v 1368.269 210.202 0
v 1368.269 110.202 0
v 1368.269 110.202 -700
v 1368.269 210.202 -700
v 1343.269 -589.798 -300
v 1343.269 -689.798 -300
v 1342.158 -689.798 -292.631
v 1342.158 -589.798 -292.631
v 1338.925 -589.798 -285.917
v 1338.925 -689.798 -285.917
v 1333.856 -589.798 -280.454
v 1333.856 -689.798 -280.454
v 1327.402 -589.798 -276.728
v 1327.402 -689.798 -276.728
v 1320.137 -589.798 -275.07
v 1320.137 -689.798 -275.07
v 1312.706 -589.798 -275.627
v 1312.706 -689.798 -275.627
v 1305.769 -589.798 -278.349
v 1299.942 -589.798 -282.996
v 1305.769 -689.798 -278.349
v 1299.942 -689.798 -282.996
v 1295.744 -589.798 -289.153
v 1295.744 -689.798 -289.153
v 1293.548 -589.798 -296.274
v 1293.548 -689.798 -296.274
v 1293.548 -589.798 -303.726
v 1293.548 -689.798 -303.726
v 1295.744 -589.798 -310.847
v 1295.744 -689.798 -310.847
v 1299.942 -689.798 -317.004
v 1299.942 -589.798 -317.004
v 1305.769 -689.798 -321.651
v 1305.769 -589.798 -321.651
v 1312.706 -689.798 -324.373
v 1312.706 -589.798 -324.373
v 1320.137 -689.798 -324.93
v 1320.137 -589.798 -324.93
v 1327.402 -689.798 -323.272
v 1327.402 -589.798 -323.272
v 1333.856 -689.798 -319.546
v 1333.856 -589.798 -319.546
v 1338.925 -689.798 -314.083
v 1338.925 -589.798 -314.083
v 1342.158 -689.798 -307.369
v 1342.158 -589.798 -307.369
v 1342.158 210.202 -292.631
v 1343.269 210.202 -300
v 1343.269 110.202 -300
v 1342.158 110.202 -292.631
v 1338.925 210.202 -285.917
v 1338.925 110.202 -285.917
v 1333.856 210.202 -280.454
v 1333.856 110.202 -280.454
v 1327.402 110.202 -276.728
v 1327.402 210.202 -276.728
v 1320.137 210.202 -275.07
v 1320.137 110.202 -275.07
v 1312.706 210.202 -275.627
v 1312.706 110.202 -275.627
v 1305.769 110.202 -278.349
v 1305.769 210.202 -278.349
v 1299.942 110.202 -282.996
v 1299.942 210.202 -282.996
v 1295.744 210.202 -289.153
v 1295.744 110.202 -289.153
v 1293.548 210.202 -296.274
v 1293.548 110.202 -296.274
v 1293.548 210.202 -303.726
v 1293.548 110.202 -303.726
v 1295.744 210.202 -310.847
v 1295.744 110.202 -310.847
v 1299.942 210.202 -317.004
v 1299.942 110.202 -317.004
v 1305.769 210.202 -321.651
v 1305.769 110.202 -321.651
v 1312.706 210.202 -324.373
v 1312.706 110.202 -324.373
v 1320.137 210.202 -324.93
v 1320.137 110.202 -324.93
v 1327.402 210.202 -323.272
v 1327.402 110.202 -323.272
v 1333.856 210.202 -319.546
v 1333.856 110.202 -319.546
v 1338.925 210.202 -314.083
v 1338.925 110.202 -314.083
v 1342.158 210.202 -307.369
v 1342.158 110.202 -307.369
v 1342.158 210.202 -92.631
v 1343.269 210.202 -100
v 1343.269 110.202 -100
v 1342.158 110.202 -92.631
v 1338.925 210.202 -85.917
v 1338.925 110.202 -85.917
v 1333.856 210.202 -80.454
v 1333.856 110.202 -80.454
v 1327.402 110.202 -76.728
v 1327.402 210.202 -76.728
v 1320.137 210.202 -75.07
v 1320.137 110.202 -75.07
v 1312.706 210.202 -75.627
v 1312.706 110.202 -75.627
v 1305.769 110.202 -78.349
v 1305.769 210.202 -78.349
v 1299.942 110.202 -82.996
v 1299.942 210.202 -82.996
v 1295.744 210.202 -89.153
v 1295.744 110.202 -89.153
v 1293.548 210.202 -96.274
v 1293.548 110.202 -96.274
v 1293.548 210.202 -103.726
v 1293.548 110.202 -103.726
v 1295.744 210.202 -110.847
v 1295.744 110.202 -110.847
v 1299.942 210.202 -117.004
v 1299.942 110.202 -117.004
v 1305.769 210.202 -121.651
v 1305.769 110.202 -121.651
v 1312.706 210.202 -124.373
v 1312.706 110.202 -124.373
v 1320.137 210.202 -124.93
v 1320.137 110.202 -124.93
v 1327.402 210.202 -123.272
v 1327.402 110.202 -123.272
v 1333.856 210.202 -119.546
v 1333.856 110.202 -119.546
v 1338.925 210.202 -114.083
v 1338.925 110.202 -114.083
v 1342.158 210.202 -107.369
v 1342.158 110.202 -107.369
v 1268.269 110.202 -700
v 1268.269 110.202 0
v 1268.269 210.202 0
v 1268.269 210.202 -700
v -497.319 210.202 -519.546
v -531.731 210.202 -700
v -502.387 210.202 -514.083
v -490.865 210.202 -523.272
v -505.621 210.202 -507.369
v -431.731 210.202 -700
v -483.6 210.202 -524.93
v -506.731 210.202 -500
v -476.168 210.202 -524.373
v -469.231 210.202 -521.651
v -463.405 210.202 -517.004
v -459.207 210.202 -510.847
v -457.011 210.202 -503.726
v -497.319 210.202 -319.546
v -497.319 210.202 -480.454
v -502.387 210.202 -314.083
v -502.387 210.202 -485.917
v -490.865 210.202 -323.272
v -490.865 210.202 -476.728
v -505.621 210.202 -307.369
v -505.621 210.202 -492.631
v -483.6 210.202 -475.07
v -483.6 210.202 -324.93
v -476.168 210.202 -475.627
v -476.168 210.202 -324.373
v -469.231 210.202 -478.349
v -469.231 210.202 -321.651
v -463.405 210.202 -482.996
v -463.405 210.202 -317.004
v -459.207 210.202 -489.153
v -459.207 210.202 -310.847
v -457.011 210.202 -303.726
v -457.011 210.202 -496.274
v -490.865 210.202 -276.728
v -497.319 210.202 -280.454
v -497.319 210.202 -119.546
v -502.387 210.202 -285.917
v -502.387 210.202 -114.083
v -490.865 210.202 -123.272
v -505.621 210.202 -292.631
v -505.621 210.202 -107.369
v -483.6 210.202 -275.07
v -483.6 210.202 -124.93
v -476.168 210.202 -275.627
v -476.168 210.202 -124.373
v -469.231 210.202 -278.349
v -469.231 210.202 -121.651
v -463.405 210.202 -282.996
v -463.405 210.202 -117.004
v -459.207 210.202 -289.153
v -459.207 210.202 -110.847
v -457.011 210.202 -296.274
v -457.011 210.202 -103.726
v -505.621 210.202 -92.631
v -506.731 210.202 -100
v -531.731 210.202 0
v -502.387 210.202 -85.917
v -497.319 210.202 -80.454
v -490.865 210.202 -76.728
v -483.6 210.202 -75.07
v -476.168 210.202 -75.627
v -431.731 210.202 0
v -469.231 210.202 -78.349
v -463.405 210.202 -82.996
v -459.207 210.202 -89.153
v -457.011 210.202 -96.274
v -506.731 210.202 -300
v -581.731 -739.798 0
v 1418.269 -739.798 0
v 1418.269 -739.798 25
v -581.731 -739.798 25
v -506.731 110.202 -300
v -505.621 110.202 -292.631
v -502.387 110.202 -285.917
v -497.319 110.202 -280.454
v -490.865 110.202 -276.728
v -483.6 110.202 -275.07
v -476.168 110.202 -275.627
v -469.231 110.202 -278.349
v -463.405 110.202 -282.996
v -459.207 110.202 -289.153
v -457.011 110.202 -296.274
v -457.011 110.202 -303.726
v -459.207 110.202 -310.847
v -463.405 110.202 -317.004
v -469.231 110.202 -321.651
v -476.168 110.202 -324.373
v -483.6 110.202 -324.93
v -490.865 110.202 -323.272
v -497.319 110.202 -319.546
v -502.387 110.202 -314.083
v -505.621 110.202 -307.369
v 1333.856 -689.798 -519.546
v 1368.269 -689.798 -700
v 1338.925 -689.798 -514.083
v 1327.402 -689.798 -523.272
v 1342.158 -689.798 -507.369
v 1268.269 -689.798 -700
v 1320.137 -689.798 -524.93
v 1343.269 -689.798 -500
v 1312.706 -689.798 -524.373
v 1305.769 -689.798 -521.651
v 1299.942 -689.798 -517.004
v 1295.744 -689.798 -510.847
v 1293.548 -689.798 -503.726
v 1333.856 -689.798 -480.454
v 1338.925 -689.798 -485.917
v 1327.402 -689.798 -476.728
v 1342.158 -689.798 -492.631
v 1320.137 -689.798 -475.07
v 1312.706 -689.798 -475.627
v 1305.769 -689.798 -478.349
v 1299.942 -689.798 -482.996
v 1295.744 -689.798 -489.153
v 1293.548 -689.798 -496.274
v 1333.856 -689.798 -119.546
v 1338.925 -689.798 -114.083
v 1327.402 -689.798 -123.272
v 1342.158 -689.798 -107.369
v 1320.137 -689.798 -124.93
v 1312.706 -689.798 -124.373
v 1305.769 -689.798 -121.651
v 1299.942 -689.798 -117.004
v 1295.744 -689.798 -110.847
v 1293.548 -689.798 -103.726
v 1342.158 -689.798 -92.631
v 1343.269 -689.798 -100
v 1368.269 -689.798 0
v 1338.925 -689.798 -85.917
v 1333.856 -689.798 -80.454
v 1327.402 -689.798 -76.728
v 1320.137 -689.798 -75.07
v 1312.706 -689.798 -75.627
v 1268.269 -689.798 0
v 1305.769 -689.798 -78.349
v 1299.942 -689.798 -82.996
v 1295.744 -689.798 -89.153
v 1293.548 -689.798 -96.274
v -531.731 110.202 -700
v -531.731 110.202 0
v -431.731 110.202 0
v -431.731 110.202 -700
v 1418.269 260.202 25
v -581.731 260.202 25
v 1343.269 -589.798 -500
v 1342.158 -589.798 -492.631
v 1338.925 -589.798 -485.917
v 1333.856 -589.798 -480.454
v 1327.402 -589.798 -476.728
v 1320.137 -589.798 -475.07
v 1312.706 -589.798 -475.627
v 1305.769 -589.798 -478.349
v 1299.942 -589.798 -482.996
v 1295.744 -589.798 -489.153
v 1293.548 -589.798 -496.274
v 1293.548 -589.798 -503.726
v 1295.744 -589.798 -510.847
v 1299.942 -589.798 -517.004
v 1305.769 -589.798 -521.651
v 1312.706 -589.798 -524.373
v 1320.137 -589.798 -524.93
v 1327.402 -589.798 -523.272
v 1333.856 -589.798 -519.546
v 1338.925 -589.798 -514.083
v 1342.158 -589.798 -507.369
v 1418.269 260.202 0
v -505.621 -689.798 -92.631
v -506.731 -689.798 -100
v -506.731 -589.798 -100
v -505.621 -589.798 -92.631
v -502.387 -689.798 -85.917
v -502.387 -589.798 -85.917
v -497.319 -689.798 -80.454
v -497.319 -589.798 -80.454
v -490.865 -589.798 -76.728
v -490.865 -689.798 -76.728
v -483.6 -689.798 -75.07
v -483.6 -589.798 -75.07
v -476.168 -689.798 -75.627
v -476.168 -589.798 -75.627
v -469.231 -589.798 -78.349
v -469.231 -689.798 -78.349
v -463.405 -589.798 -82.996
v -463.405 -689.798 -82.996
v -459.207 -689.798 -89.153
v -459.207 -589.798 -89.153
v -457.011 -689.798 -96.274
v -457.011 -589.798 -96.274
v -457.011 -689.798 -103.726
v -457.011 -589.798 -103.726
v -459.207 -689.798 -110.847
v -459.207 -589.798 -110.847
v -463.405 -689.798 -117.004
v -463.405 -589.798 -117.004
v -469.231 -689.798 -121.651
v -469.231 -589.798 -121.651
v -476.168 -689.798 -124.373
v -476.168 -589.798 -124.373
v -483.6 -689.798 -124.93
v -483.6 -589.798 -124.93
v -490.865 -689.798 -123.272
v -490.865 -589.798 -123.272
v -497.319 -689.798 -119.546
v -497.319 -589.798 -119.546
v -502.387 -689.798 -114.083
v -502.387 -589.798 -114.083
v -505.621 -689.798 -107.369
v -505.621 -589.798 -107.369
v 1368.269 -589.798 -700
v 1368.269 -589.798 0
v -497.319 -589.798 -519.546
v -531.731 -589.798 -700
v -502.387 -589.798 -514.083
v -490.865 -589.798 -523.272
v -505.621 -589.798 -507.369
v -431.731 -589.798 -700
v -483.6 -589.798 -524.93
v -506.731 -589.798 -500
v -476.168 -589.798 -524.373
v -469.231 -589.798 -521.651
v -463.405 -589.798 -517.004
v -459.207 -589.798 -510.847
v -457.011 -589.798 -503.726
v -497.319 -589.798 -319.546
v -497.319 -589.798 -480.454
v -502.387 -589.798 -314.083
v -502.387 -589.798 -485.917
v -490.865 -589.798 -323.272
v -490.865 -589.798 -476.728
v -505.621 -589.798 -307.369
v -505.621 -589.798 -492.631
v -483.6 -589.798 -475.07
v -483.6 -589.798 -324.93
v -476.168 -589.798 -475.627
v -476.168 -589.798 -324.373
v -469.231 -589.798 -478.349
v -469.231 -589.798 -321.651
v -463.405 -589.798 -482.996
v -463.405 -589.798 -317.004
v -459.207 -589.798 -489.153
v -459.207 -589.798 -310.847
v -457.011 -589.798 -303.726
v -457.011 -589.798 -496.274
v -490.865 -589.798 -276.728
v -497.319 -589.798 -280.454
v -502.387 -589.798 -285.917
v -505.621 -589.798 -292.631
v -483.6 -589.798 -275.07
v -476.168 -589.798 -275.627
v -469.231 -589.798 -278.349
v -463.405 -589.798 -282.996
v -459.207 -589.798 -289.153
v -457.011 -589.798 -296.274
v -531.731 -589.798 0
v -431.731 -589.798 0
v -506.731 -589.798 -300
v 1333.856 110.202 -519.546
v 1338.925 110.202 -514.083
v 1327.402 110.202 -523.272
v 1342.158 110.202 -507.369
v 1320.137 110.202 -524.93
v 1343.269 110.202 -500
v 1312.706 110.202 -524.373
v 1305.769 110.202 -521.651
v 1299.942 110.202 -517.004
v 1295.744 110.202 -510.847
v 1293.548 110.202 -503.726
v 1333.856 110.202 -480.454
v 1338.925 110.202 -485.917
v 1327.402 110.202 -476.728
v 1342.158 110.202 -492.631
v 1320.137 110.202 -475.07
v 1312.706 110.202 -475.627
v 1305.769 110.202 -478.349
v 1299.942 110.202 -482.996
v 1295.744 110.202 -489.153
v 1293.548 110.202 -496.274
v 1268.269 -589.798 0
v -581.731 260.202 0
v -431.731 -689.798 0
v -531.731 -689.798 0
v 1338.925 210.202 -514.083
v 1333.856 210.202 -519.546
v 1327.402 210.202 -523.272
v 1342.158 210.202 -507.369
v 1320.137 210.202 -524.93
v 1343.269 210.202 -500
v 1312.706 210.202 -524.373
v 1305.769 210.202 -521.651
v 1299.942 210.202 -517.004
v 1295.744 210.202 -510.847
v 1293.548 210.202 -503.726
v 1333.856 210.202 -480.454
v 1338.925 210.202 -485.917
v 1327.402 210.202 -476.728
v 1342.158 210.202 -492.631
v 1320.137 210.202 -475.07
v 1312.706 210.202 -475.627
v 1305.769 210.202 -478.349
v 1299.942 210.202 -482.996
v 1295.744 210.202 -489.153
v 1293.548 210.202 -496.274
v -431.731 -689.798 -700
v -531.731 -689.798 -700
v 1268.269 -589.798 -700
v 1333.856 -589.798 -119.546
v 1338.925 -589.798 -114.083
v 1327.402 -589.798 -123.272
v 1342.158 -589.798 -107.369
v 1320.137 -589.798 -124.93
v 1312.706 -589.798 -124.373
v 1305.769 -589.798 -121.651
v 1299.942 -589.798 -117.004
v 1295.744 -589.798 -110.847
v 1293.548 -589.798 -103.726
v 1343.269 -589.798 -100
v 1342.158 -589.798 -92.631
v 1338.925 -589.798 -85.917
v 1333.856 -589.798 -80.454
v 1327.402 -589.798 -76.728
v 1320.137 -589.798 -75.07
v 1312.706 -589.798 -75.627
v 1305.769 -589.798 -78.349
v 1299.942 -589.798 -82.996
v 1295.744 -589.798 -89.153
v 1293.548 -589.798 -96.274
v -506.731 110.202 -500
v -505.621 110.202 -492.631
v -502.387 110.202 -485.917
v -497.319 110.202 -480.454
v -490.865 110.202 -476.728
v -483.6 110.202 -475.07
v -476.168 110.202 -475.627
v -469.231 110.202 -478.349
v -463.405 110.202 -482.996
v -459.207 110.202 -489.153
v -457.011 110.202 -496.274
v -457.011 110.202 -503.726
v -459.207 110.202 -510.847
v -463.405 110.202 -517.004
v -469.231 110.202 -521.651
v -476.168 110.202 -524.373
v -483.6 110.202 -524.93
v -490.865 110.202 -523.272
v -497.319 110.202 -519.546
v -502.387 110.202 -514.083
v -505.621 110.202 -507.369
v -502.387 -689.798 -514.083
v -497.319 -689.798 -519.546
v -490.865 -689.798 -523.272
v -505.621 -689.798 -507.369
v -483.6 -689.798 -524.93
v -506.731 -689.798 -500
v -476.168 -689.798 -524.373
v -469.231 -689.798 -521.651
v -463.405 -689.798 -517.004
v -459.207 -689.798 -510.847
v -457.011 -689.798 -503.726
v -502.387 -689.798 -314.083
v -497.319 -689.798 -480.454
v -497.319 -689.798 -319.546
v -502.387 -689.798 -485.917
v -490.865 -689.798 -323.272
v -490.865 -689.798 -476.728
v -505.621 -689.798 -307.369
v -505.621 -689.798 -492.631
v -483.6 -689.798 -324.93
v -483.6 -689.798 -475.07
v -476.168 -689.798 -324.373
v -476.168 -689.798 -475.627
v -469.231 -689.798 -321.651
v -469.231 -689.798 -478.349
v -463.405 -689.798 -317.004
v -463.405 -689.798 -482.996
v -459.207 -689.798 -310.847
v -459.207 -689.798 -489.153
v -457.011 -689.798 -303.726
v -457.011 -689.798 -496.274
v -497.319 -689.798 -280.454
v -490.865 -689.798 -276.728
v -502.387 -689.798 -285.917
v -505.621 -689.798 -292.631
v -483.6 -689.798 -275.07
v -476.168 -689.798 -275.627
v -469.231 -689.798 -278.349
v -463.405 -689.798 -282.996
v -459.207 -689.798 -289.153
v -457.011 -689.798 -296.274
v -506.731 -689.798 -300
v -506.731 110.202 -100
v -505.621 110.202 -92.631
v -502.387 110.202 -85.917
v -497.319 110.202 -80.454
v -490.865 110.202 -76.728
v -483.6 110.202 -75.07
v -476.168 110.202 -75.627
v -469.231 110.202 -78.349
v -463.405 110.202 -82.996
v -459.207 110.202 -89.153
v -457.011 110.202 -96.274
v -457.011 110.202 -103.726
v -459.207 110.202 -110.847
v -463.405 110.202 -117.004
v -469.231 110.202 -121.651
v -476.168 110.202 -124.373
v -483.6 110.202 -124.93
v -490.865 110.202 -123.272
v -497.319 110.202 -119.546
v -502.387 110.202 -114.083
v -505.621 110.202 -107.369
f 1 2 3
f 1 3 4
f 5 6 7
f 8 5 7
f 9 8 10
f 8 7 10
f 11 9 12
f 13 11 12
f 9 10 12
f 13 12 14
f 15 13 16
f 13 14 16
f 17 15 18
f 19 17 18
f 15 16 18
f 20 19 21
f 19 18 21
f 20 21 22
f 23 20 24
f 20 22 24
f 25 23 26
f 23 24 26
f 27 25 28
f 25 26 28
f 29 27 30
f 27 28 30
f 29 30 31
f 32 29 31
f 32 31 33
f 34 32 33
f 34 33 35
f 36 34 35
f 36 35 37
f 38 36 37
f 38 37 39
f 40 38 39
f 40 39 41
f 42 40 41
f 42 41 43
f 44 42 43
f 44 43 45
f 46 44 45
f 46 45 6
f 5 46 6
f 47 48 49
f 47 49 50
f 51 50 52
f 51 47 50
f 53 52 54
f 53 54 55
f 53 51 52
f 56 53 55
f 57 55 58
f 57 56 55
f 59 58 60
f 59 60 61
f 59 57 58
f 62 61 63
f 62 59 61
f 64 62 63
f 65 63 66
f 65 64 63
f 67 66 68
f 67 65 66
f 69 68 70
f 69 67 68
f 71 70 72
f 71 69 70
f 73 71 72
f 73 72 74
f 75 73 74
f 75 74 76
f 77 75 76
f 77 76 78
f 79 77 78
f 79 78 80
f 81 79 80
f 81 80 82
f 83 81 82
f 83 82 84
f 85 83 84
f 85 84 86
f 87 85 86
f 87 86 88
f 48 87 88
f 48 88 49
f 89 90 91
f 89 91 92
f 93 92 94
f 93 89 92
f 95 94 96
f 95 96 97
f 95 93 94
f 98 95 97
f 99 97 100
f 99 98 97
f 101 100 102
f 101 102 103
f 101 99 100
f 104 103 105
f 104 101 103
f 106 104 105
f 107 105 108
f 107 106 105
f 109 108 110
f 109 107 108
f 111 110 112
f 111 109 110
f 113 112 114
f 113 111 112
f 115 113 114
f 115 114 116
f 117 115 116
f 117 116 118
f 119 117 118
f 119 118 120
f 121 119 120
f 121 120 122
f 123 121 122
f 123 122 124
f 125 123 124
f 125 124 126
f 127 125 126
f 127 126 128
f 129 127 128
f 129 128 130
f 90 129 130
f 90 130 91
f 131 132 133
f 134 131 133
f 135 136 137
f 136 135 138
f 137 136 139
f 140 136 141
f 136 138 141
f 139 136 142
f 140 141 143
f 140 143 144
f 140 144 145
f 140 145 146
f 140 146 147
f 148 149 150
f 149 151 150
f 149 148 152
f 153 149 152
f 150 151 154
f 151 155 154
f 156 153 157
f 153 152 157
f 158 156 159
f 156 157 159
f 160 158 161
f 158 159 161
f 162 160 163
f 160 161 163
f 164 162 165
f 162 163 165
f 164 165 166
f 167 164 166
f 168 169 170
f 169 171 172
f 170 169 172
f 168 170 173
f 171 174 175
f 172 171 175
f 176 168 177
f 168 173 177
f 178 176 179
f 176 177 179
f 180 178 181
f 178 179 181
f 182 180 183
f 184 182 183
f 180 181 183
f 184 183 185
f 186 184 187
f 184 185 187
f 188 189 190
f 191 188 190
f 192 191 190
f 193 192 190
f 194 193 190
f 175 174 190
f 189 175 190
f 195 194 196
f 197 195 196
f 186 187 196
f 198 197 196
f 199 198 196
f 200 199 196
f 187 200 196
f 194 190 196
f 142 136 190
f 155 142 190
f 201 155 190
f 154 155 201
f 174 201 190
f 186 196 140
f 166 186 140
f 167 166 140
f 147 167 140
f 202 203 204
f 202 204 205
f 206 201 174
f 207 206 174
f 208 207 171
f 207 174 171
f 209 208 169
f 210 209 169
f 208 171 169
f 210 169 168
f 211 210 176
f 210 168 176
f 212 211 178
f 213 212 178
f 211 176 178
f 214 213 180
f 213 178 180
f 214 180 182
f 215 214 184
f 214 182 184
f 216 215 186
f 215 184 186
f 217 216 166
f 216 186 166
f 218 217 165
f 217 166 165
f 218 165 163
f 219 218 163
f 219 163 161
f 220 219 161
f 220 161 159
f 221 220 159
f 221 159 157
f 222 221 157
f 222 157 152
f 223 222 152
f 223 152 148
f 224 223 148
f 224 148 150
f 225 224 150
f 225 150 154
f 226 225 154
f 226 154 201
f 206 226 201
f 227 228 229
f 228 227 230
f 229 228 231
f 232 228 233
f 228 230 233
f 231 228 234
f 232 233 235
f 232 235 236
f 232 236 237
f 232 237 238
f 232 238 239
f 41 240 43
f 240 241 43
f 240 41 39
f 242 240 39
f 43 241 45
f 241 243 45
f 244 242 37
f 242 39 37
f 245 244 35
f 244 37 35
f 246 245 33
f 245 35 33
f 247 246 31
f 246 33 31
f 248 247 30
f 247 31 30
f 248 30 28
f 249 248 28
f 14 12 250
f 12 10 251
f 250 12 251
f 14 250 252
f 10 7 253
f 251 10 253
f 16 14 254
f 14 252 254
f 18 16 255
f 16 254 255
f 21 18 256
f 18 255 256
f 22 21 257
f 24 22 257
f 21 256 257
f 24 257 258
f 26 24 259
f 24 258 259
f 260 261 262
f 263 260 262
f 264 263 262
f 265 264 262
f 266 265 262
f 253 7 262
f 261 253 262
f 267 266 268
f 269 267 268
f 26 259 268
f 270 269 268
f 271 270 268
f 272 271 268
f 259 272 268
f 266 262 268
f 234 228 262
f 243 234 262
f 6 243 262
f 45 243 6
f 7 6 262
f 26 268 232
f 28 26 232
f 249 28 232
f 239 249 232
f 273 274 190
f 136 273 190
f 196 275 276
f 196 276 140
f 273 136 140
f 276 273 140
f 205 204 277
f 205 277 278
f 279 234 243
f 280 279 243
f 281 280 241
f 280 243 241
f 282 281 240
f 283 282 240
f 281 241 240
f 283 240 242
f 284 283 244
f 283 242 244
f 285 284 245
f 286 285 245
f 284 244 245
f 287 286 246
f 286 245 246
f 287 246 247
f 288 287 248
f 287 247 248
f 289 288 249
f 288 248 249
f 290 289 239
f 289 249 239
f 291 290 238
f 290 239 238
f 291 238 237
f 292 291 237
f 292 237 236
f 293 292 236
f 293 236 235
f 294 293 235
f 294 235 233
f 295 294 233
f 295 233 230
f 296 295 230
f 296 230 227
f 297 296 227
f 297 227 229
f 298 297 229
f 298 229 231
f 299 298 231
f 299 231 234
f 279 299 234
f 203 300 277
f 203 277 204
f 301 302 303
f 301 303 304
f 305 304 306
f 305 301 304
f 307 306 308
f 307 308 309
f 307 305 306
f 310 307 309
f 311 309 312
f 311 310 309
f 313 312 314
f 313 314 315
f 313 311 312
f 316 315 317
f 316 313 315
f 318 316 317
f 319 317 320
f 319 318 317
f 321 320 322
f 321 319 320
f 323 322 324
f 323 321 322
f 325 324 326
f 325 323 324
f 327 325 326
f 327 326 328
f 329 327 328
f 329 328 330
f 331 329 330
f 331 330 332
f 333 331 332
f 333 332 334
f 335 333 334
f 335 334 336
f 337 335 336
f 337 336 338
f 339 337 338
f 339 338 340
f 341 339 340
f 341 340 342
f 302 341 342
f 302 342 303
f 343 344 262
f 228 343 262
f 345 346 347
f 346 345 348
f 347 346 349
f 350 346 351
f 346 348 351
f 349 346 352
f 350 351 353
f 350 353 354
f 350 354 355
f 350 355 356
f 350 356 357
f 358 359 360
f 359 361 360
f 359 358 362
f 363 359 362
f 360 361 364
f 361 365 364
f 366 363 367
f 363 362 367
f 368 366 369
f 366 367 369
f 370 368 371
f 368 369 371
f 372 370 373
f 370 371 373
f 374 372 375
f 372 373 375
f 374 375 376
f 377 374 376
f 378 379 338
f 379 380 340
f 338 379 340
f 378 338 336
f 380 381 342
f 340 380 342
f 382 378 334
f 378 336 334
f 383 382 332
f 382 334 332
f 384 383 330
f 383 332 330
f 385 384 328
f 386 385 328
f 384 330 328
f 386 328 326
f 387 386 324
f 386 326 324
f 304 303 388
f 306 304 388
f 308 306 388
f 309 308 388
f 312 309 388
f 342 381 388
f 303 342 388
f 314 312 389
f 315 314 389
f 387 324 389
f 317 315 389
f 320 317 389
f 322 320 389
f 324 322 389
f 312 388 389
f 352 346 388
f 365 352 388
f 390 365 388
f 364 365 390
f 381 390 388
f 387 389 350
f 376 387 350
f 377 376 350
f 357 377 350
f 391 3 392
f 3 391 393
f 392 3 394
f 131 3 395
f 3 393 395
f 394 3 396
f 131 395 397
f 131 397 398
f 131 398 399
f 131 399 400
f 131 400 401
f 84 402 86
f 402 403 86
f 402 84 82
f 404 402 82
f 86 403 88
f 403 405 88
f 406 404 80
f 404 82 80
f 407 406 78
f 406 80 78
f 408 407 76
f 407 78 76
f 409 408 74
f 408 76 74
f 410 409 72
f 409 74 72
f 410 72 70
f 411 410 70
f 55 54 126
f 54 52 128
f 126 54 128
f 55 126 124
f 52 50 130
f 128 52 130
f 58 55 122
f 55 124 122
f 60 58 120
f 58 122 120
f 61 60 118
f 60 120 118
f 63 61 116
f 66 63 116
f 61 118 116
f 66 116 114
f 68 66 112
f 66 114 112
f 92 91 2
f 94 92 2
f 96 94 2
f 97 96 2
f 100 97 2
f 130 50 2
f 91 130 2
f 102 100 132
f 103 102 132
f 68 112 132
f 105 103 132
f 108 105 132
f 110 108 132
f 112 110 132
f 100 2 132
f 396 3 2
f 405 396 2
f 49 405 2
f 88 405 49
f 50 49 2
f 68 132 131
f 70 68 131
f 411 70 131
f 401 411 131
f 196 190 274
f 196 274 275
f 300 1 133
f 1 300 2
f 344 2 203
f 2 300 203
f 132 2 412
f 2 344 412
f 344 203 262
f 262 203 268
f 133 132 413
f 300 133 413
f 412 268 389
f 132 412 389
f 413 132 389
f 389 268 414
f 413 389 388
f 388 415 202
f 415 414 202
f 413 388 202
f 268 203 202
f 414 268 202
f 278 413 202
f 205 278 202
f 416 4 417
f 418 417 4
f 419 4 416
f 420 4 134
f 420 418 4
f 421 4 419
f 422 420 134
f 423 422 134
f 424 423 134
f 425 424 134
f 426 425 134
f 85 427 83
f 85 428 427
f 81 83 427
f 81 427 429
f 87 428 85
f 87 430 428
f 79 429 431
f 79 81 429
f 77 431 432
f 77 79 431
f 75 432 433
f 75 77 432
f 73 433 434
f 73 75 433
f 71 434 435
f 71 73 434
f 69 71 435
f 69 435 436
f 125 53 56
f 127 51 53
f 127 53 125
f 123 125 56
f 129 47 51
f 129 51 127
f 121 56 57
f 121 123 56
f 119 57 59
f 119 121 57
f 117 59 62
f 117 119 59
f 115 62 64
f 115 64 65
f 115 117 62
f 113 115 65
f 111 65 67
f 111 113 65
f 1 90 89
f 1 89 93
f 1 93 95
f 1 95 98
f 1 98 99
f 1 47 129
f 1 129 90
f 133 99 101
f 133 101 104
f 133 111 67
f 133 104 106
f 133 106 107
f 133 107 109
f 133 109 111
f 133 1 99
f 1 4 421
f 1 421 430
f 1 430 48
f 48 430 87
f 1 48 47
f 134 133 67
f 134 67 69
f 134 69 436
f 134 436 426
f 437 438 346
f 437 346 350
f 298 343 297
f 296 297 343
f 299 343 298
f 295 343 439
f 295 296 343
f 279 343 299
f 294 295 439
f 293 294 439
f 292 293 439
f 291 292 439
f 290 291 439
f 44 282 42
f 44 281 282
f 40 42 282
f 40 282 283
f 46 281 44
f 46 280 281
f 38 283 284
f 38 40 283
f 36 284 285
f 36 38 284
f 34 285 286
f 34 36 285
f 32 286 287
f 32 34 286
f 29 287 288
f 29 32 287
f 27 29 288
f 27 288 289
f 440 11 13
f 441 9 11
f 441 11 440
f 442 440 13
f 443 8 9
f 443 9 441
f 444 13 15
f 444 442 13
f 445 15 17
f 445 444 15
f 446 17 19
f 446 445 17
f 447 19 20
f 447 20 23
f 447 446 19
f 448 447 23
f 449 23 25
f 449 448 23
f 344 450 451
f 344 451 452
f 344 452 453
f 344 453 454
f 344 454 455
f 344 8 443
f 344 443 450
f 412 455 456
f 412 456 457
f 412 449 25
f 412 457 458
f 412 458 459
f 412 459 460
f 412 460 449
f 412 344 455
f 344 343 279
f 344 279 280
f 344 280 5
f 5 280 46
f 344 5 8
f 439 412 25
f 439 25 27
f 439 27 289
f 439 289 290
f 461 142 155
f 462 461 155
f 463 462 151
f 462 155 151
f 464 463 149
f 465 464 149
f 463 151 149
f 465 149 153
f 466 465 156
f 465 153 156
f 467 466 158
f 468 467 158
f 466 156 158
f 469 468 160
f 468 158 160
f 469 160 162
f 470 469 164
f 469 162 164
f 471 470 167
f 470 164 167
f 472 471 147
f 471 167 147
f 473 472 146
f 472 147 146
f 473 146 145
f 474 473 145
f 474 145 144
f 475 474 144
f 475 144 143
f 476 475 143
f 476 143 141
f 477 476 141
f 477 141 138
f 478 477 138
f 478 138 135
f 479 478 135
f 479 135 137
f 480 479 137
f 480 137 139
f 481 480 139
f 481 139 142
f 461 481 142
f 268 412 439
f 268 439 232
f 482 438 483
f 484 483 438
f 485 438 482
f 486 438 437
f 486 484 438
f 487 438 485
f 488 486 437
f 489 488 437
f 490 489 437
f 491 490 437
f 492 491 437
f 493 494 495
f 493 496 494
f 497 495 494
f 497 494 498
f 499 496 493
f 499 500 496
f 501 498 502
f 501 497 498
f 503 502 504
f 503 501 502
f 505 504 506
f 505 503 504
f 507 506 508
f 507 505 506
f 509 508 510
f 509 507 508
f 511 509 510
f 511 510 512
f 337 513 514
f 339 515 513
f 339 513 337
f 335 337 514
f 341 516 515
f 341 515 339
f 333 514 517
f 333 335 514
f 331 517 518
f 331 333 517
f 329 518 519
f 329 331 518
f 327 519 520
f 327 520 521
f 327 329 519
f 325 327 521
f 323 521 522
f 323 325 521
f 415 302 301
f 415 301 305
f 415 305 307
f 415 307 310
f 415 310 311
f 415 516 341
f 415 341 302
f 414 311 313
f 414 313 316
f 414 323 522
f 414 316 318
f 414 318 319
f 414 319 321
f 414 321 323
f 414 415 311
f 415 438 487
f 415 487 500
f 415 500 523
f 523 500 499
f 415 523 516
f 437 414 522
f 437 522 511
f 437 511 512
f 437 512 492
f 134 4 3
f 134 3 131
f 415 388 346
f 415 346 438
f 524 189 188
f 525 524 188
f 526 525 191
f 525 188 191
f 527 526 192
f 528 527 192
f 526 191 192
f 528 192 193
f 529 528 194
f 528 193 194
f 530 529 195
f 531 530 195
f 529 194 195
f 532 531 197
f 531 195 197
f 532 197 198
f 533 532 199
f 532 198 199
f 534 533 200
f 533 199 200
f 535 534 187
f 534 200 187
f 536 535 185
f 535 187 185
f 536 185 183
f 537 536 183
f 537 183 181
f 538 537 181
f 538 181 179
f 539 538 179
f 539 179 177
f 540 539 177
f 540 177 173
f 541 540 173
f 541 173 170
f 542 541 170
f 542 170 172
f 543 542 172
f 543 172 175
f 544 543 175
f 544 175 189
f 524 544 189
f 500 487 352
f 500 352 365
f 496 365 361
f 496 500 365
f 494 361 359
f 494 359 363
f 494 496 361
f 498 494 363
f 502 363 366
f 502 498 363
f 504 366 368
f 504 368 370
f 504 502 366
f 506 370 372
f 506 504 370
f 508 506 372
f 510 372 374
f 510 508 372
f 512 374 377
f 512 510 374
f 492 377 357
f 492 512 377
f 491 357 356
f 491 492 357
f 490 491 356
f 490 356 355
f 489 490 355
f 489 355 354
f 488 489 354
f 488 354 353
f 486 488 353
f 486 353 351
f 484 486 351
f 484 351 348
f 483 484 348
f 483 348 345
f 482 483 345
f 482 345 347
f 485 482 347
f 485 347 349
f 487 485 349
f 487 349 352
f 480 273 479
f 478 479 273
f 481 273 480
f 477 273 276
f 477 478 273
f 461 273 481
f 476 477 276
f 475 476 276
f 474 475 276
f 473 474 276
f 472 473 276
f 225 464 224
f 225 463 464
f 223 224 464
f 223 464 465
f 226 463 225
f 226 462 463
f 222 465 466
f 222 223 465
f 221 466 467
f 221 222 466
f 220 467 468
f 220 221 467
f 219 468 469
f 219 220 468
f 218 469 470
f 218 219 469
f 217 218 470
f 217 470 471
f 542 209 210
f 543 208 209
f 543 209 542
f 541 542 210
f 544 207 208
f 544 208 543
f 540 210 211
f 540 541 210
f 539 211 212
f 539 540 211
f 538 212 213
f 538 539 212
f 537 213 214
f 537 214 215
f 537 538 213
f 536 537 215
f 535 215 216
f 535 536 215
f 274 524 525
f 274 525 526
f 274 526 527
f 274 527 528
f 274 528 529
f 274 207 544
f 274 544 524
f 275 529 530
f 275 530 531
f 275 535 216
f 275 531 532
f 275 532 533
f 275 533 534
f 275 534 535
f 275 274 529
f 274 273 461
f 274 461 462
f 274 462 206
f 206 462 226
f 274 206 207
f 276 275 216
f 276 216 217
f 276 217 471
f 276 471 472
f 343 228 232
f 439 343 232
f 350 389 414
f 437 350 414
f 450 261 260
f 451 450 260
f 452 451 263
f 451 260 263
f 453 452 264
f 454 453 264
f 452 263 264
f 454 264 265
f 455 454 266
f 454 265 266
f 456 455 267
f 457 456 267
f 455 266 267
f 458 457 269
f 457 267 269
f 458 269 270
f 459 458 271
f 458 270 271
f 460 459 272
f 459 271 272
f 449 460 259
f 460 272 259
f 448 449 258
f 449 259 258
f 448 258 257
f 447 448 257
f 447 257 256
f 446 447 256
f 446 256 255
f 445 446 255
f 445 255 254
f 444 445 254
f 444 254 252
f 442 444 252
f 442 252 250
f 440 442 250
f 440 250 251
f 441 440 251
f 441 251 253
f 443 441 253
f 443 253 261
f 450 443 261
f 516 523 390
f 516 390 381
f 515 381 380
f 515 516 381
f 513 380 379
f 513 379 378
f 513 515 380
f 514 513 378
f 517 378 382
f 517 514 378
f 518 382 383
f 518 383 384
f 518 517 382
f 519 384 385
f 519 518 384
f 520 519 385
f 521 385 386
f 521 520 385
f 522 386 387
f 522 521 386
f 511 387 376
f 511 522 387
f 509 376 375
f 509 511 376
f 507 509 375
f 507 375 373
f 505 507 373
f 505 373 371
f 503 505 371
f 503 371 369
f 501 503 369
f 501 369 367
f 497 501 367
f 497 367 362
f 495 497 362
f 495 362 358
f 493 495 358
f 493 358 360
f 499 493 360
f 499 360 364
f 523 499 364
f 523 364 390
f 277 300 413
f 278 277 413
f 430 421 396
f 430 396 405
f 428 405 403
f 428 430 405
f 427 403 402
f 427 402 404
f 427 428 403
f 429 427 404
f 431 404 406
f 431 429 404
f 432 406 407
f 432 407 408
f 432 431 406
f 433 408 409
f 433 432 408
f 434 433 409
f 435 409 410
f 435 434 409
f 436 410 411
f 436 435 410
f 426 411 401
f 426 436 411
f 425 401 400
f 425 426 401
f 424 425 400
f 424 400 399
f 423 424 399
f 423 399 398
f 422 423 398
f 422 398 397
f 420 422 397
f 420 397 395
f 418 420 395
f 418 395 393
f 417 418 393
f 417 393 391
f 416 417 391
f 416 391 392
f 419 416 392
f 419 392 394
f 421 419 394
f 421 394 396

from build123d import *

# Parameters (mm, degrees)
F0_W     = 1000
F0_H     = 500
F0_W_2   = 100
F0_H_2   = 100
F1_DEPTH = 25
F2_DEPTH = 700
F4_D     = 50


with BuildPart() as f1:
    # F0 (on Top) → F1 (new body)
    with BuildSketch(Plane.XY):
        with Locations((-81.7313119769, 10.2016413486)):
            Rectangle(F0_W, F0_H)
        with Locations((-481.7313119769, 160.2016413486)):
            Rectangle(F0_W_2, F0_H_2, mode=Mode.SUBTRACT)
        with Locations((-481.7313119769, 160.2016413486)):
            Rectangle(F0_W_2, F0_H_2)
    extrude(amount=F1_DEPTH)

    # F5: F1, F2 across face


with BuildPart() as f2:
    # F0 (on Top) → F2 (new body)
    with BuildSketch(Plane.XY):
        with Locations((-481.7313119769, 160.2016413486)):
            Rectangle(F0_W_2, F0_H_2)
    extrude(amount=-F2_DEPTH)

    # F4 (through all)
    with Locations(Plane.XZ):
        with Locations((-481.7313119769, -100), (-481.7313119769, -300), (-481.7313119769, -500)):
            Hole(F4_D / 2)


with BuildPart() as f1_1:
    add(f1.part)
    add(f1.part.mirror(Plane(origin=(-81.7313119769, -239.7983586514, 12.5), x_dir=(1, 0, 0), z_dir=(0, -1, 0))))
    add(f2.part.mirror(Plane(origin=(-81.7313119769, -239.7983586514, 12.5), x_dir=(1, 0, 0), z_dir=(0, -1, 0))))

    # F6: F1, F2 across face


with BuildPart() as f1_2:
    add(f1_1.part)
    add(f1_1.part.mirror(Plane(origin=(418.2686880231, -239.7983586514, 12.5), x_dir=(0, 1, 0), z_dir=(1, 0, 0))))
    add(f2.part.mirror(Plane(origin=(418.2686880231, -239.7983586514, 12.5), x_dir=(0, 1, 0), z_dir=(1, 0, 0))))


solid = Compound([f2.part, f1_2.part])
